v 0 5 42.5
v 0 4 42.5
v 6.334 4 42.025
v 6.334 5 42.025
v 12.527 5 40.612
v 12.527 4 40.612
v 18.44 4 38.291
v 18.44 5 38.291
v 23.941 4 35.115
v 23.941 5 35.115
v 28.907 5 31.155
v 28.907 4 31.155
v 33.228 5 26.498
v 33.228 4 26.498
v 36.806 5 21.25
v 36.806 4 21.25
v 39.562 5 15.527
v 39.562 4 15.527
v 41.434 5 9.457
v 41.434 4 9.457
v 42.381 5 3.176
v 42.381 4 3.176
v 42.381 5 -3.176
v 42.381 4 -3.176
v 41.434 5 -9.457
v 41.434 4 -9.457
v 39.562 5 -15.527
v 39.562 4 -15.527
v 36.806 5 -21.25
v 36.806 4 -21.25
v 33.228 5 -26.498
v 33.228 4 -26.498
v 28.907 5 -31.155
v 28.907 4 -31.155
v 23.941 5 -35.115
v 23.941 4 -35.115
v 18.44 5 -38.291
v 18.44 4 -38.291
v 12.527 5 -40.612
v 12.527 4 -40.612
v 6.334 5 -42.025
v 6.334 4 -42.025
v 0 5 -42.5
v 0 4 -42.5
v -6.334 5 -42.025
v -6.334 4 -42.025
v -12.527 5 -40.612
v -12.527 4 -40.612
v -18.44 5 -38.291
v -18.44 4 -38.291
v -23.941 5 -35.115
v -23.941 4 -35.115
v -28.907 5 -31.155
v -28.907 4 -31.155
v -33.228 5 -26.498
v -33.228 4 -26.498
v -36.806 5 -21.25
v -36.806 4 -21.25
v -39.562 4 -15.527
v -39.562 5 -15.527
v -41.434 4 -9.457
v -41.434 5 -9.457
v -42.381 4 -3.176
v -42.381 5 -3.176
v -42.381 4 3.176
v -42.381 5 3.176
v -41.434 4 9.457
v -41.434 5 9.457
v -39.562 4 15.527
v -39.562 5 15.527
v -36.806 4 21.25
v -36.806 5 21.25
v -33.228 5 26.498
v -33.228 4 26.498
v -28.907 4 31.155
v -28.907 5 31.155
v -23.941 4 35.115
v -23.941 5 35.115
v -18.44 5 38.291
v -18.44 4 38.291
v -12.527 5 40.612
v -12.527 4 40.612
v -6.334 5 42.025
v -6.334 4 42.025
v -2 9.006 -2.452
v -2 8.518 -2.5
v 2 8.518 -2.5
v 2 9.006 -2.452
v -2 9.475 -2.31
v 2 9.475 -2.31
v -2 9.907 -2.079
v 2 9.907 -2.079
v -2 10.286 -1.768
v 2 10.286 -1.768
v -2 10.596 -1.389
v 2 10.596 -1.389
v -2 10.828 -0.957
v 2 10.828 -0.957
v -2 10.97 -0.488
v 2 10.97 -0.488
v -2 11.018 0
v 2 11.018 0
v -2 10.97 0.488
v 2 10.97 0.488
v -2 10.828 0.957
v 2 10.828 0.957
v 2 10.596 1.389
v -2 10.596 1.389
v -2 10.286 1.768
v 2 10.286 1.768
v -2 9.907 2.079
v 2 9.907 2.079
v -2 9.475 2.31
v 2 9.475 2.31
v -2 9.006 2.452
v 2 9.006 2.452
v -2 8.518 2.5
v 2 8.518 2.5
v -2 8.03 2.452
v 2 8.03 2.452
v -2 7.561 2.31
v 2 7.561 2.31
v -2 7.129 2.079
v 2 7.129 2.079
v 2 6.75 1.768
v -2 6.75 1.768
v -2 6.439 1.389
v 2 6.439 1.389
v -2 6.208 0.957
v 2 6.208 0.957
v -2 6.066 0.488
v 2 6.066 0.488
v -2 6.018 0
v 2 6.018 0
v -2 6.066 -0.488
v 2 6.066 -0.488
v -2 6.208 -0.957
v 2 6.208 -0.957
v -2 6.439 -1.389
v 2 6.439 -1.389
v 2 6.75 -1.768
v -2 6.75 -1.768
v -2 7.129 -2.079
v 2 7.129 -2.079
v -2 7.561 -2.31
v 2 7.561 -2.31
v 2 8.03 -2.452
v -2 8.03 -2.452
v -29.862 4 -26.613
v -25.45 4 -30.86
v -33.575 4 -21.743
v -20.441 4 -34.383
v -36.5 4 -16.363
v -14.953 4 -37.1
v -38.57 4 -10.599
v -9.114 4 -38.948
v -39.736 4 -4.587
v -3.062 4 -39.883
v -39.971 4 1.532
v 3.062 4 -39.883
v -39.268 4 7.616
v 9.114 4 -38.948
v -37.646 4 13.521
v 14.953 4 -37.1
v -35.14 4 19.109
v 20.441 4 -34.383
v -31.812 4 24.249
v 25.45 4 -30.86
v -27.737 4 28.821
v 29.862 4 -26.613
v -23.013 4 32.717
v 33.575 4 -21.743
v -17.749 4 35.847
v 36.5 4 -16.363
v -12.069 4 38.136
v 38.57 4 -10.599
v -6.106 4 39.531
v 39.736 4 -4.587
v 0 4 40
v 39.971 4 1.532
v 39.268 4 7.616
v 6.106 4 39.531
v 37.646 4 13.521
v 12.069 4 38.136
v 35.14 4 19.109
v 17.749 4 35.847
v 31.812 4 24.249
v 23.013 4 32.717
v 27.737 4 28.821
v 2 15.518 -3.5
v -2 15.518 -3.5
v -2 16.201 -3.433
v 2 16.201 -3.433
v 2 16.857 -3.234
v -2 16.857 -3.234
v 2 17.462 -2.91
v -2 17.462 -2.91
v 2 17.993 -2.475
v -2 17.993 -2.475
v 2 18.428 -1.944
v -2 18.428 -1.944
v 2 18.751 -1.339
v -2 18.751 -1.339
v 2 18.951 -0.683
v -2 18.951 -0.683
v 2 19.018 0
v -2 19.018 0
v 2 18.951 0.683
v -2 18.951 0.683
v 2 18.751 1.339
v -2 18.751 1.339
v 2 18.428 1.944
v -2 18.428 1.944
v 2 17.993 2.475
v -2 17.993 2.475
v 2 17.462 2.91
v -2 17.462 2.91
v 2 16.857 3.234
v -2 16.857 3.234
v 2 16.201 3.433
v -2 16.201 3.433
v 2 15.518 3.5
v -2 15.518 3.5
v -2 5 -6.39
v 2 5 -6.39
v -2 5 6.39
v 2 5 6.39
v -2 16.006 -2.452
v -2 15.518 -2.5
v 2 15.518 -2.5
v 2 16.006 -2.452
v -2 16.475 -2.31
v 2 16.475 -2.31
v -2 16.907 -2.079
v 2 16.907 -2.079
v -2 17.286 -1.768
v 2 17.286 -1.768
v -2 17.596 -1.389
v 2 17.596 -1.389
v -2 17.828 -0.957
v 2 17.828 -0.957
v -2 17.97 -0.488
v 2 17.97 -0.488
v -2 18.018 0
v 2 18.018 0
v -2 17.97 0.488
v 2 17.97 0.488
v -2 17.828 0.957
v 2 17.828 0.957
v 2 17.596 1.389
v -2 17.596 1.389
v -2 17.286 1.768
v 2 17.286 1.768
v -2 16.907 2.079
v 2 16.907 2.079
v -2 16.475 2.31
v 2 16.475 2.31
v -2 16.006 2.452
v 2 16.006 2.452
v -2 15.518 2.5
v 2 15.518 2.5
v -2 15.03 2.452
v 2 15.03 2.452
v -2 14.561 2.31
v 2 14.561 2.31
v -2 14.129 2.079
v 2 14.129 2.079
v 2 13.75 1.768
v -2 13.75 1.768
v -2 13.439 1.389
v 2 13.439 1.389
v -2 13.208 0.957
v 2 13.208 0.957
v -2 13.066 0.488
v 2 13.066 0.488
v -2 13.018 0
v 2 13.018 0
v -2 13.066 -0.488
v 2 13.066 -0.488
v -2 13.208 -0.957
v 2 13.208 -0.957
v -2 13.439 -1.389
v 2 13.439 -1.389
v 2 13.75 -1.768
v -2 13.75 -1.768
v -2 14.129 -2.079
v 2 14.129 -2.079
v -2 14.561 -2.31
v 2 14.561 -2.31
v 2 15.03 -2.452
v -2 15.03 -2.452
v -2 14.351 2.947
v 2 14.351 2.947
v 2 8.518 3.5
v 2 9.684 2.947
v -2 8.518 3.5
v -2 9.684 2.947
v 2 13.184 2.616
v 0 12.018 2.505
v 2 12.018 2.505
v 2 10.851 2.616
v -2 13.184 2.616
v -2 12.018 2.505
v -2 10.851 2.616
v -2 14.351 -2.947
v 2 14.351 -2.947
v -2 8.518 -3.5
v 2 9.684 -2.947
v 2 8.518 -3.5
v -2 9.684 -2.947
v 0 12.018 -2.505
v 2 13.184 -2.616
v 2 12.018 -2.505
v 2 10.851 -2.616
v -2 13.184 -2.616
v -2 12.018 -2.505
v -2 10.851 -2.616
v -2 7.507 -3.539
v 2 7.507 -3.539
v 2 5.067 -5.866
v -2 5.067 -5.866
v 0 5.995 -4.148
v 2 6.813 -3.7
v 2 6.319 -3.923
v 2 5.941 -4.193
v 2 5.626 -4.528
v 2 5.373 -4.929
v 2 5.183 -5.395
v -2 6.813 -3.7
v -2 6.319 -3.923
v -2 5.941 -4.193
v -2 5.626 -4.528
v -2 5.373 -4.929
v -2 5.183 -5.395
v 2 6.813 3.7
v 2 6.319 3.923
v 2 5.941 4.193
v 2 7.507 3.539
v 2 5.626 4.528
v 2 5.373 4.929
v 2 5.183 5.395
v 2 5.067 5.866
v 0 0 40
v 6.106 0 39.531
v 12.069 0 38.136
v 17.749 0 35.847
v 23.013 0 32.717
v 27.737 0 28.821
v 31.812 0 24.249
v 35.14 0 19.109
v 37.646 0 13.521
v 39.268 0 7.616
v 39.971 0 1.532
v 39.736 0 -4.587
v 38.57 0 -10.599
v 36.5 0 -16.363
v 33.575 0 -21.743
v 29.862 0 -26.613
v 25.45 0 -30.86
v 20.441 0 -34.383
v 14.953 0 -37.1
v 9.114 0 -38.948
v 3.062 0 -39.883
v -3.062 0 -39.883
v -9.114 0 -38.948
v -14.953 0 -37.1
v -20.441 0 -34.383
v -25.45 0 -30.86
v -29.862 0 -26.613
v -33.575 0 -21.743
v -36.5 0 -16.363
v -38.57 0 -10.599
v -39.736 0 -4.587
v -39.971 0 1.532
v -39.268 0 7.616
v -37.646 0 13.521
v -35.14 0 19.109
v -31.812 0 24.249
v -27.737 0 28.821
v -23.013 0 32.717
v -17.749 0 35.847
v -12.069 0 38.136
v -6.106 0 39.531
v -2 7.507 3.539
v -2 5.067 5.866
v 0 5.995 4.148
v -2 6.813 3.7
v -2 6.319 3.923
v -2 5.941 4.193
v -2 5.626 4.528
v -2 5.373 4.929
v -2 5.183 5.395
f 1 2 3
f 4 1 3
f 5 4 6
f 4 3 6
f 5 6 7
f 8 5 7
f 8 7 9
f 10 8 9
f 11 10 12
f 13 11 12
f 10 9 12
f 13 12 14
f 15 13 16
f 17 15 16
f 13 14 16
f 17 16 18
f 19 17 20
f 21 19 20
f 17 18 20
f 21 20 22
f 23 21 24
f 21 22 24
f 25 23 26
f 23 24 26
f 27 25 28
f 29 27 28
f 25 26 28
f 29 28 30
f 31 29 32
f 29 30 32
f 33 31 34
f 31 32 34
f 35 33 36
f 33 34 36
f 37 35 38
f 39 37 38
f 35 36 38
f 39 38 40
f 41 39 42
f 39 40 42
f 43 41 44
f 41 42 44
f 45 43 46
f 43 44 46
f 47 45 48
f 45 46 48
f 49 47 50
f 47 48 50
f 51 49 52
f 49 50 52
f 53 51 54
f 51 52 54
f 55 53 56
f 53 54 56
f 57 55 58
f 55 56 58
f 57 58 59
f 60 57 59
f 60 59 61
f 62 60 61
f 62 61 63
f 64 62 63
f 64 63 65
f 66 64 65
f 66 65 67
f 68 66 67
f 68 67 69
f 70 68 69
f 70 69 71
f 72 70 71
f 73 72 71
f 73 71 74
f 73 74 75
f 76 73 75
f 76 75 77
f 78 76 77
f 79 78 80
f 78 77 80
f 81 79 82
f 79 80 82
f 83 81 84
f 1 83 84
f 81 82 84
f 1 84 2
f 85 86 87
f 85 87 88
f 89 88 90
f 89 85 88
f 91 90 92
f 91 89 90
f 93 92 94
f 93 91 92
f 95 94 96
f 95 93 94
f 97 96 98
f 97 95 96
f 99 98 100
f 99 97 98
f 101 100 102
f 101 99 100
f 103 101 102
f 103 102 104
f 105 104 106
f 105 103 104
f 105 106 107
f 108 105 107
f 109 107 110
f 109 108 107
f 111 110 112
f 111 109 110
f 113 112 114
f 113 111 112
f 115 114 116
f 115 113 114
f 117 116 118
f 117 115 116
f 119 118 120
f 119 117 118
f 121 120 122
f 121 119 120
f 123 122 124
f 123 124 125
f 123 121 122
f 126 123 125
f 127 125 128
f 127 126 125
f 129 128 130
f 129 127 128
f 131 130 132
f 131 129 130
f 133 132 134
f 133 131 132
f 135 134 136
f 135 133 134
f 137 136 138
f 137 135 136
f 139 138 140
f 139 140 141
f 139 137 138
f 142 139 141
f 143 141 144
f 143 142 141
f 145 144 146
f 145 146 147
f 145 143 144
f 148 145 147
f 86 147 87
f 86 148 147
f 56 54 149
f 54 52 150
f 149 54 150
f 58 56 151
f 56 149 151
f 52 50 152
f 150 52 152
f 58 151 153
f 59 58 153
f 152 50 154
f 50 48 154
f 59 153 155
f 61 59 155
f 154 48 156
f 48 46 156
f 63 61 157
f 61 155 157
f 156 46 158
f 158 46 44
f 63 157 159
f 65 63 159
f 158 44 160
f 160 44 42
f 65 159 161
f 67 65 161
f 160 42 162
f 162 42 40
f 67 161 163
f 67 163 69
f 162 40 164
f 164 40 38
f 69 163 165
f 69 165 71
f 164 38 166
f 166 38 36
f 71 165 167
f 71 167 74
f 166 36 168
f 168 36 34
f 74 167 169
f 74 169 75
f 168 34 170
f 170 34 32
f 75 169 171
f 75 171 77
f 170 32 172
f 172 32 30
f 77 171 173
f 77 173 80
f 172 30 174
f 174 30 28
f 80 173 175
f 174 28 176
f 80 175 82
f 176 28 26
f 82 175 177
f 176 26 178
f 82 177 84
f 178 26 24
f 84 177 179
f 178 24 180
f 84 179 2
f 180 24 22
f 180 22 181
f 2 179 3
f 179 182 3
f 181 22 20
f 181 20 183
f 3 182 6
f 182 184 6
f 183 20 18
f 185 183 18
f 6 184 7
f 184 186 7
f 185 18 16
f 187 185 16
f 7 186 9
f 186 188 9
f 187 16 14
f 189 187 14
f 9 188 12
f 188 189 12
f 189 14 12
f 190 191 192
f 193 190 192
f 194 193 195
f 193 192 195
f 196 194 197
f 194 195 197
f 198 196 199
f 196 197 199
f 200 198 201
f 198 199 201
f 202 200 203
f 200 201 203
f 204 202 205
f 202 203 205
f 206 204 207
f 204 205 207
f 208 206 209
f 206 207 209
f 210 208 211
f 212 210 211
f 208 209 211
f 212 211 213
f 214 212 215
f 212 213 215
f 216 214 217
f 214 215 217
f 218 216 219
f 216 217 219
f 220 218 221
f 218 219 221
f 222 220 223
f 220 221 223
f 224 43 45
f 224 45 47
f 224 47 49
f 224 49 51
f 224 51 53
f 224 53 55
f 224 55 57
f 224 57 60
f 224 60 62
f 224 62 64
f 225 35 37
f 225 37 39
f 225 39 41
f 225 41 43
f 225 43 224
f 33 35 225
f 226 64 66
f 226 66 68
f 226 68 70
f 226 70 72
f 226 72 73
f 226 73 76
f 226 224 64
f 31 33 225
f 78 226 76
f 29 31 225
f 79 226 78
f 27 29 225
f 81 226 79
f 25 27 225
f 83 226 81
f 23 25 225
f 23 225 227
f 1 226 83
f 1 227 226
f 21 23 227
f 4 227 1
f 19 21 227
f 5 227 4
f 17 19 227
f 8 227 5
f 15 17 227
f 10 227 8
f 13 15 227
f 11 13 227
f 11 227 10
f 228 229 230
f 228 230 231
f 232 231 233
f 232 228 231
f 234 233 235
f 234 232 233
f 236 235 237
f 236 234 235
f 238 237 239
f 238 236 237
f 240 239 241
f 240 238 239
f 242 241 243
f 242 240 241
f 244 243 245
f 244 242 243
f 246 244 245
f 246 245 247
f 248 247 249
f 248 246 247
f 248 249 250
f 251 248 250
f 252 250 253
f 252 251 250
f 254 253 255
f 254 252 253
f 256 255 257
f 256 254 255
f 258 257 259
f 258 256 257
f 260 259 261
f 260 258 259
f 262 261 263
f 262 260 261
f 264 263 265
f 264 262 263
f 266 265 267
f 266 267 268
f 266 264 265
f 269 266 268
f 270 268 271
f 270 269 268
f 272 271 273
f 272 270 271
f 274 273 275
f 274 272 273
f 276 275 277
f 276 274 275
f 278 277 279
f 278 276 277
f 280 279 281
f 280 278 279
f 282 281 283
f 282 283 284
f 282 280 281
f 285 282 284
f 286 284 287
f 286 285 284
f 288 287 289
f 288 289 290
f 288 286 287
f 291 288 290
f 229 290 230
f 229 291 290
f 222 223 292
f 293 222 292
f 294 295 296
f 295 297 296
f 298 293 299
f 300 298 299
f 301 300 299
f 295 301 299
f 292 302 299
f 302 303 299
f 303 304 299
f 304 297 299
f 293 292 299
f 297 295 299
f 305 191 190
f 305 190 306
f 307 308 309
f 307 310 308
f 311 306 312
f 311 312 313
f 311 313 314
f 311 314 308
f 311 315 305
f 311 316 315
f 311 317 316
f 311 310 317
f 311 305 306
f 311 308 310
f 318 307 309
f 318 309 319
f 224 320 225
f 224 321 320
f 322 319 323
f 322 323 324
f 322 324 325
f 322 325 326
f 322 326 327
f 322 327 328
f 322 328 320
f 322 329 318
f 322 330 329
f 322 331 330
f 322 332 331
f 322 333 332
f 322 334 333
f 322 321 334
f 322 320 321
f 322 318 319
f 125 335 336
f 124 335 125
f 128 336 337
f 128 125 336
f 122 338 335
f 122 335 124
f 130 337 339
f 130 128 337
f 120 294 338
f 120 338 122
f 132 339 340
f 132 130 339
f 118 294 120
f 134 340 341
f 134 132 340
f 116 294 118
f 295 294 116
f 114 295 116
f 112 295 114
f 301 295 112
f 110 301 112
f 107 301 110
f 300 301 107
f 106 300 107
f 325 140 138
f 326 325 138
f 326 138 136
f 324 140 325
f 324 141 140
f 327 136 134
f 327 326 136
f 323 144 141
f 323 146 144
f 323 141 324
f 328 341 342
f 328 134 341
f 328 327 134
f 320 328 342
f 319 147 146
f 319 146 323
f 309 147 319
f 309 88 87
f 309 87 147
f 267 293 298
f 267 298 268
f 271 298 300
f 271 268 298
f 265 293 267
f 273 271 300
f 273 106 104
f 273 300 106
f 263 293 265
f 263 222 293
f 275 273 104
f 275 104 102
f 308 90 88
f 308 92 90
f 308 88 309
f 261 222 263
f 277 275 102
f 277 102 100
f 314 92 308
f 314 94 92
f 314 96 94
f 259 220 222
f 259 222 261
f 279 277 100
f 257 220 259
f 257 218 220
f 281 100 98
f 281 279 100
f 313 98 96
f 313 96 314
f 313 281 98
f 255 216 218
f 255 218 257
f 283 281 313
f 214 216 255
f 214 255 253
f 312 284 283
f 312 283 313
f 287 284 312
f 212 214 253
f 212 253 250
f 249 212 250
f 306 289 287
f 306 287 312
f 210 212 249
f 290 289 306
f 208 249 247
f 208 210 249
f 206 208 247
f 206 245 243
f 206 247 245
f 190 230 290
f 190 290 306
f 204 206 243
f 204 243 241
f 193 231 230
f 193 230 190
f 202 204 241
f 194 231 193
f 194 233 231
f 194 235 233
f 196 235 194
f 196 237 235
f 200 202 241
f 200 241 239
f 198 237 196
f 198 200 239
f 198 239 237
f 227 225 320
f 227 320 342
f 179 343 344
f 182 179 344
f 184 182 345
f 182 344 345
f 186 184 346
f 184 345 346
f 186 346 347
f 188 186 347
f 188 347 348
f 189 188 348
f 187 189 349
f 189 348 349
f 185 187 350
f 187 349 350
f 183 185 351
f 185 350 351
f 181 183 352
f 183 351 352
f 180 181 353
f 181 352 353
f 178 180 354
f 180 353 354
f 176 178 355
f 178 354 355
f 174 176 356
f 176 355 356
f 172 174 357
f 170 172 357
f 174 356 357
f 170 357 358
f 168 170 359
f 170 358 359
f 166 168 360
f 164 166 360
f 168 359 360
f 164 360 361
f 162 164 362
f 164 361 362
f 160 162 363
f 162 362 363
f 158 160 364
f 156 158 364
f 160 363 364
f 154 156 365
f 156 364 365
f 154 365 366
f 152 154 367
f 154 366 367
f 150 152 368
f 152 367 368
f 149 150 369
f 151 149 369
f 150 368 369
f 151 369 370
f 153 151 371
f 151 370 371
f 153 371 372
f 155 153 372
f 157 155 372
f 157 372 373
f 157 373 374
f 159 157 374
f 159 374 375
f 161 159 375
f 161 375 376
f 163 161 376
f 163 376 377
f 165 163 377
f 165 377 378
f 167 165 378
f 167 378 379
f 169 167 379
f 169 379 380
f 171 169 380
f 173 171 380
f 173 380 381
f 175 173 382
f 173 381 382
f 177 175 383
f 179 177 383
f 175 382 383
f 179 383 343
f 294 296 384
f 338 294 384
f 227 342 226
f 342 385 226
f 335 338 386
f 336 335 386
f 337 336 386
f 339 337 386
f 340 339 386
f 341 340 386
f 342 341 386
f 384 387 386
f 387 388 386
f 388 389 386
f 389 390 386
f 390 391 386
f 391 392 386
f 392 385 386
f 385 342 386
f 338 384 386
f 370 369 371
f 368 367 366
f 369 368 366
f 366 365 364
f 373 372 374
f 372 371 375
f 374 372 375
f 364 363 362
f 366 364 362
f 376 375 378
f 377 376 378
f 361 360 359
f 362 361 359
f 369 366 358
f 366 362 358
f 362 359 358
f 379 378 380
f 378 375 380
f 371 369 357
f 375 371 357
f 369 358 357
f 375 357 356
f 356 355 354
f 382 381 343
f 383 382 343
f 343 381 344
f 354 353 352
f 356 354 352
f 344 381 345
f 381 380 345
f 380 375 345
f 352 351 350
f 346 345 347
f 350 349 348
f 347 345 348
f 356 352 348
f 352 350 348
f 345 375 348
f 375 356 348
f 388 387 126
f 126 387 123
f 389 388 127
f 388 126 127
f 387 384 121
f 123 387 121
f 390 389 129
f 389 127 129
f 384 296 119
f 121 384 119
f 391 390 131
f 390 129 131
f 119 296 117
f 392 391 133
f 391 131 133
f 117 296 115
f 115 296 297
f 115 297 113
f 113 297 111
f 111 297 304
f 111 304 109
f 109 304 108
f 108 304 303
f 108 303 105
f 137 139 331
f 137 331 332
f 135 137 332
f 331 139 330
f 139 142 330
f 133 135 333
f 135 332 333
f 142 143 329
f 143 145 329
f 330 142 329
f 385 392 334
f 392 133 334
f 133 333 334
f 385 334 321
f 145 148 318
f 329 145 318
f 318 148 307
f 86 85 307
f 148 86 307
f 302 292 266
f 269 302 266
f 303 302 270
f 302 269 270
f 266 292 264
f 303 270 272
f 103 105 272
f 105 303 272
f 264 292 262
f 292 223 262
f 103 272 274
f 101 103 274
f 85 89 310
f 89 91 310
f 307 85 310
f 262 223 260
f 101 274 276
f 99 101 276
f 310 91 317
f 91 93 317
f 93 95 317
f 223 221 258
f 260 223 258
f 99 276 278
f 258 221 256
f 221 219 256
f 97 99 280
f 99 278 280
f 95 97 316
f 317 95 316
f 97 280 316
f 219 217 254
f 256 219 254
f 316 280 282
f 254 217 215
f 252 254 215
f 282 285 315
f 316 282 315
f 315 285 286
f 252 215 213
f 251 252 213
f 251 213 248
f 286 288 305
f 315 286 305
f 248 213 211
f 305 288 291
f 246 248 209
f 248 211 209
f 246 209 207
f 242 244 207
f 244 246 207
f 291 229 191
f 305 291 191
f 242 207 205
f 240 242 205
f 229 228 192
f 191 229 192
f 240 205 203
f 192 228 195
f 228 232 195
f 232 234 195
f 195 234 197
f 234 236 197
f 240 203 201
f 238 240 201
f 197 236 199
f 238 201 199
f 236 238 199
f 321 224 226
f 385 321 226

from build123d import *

# Parameters (mm, degrees)
SKETCH_3_R           = 40
EXTRUDE_1_DEPTH      = 4
SKETCH_4_R           = 42.5
EXTRUDE_2_DEPTH      = 1
EXTRUDE_3_DEPTH      = 2
EXTRUDE_3_DEPTH_BACK = 2
SKETCH_5_R           = 2.5


with BuildPart() as part:
    # Эскиз3 → Бобышка-Вытянуть1 (new body)
    with BuildSketch(Plane(origin=(0, 0, 0), x_dir=(1, 0, 0), z_dir=(0, 1, 0))):
        Circle(SKETCH_3_R)
    extrude(amount=EXTRUDE_1_DEPTH)

    # Эскиз4 → Бобышка-Вытянуть2 (add)
    with BuildSketch(Plane(origin=(0, 4, 0), x_dir=(1, 0, 0), z_dir=(0, 1, 0))):
        Circle(SKETCH_4_R)
    extrude(amount=EXTRUDE_2_DEPTH)

    # Эскиз5 → Бобышка-Вытянуть3 (add, two sides: drawn at the far end of the back side and taken through both)
    with BuildSketch(Plane(origin=(0, 0, 0), x_dir=(0, 0, -1), z_dir=(1, 0, 0)).offset(-EXTRUDE_3_DEPTH_BACK)):
        with BuildLine():
            add(Edge.make_bspline(
                [(-3.5, 8.517823555), (-3.350300092, 5.23093062), (-6.389981791, 5)],
                knots=[0, 0, 0, 0.868708242, 0.868708242, 0.868708242], degree=2))
            Line((-6.389981791, 5), (6.389981791, 5))
            add(Edge.make_bspline(
                [(3.5, 8.517823555), (3.350300092, 5.23093062), (6.389981791, 5)],
                knots=[0, 0, 0, 0.868708242, 0.868708242, 0.868708242], degree=2))
            add(Edge.make_bspline(
                [(3.5, 15.517823555), (1.510674253, 12.017823555), (3.5, 8.517823555)],
                knots=[0, 0, 0, 1, 1, 1], degree=2))
            ThreePointArc((3.5, 15.517823555), (0, 19.017823555), (-3.5, 15.517823555))
            add(Edge.make_bspline(
                [(-3.5, 15.517823555), (-1.510674253, 12.017823555), (-3.5, 8.517823555)],
                knots=[0, 0, 0, 1, 1, 1], degree=2))
        make_face()
        with Locations((0, 8.517823555)):
            Circle(SKETCH_5_R, mode=Mode.SUBTRACT)
        with Locations((0, 15.517823555)):
            Circle(SKETCH_5_R, mode=Mode.SUBTRACT)
    extrude(amount=EXTRUDE_3_DEPTH + EXTRUDE_3_DEPTH_BACK)


solid = part.part
